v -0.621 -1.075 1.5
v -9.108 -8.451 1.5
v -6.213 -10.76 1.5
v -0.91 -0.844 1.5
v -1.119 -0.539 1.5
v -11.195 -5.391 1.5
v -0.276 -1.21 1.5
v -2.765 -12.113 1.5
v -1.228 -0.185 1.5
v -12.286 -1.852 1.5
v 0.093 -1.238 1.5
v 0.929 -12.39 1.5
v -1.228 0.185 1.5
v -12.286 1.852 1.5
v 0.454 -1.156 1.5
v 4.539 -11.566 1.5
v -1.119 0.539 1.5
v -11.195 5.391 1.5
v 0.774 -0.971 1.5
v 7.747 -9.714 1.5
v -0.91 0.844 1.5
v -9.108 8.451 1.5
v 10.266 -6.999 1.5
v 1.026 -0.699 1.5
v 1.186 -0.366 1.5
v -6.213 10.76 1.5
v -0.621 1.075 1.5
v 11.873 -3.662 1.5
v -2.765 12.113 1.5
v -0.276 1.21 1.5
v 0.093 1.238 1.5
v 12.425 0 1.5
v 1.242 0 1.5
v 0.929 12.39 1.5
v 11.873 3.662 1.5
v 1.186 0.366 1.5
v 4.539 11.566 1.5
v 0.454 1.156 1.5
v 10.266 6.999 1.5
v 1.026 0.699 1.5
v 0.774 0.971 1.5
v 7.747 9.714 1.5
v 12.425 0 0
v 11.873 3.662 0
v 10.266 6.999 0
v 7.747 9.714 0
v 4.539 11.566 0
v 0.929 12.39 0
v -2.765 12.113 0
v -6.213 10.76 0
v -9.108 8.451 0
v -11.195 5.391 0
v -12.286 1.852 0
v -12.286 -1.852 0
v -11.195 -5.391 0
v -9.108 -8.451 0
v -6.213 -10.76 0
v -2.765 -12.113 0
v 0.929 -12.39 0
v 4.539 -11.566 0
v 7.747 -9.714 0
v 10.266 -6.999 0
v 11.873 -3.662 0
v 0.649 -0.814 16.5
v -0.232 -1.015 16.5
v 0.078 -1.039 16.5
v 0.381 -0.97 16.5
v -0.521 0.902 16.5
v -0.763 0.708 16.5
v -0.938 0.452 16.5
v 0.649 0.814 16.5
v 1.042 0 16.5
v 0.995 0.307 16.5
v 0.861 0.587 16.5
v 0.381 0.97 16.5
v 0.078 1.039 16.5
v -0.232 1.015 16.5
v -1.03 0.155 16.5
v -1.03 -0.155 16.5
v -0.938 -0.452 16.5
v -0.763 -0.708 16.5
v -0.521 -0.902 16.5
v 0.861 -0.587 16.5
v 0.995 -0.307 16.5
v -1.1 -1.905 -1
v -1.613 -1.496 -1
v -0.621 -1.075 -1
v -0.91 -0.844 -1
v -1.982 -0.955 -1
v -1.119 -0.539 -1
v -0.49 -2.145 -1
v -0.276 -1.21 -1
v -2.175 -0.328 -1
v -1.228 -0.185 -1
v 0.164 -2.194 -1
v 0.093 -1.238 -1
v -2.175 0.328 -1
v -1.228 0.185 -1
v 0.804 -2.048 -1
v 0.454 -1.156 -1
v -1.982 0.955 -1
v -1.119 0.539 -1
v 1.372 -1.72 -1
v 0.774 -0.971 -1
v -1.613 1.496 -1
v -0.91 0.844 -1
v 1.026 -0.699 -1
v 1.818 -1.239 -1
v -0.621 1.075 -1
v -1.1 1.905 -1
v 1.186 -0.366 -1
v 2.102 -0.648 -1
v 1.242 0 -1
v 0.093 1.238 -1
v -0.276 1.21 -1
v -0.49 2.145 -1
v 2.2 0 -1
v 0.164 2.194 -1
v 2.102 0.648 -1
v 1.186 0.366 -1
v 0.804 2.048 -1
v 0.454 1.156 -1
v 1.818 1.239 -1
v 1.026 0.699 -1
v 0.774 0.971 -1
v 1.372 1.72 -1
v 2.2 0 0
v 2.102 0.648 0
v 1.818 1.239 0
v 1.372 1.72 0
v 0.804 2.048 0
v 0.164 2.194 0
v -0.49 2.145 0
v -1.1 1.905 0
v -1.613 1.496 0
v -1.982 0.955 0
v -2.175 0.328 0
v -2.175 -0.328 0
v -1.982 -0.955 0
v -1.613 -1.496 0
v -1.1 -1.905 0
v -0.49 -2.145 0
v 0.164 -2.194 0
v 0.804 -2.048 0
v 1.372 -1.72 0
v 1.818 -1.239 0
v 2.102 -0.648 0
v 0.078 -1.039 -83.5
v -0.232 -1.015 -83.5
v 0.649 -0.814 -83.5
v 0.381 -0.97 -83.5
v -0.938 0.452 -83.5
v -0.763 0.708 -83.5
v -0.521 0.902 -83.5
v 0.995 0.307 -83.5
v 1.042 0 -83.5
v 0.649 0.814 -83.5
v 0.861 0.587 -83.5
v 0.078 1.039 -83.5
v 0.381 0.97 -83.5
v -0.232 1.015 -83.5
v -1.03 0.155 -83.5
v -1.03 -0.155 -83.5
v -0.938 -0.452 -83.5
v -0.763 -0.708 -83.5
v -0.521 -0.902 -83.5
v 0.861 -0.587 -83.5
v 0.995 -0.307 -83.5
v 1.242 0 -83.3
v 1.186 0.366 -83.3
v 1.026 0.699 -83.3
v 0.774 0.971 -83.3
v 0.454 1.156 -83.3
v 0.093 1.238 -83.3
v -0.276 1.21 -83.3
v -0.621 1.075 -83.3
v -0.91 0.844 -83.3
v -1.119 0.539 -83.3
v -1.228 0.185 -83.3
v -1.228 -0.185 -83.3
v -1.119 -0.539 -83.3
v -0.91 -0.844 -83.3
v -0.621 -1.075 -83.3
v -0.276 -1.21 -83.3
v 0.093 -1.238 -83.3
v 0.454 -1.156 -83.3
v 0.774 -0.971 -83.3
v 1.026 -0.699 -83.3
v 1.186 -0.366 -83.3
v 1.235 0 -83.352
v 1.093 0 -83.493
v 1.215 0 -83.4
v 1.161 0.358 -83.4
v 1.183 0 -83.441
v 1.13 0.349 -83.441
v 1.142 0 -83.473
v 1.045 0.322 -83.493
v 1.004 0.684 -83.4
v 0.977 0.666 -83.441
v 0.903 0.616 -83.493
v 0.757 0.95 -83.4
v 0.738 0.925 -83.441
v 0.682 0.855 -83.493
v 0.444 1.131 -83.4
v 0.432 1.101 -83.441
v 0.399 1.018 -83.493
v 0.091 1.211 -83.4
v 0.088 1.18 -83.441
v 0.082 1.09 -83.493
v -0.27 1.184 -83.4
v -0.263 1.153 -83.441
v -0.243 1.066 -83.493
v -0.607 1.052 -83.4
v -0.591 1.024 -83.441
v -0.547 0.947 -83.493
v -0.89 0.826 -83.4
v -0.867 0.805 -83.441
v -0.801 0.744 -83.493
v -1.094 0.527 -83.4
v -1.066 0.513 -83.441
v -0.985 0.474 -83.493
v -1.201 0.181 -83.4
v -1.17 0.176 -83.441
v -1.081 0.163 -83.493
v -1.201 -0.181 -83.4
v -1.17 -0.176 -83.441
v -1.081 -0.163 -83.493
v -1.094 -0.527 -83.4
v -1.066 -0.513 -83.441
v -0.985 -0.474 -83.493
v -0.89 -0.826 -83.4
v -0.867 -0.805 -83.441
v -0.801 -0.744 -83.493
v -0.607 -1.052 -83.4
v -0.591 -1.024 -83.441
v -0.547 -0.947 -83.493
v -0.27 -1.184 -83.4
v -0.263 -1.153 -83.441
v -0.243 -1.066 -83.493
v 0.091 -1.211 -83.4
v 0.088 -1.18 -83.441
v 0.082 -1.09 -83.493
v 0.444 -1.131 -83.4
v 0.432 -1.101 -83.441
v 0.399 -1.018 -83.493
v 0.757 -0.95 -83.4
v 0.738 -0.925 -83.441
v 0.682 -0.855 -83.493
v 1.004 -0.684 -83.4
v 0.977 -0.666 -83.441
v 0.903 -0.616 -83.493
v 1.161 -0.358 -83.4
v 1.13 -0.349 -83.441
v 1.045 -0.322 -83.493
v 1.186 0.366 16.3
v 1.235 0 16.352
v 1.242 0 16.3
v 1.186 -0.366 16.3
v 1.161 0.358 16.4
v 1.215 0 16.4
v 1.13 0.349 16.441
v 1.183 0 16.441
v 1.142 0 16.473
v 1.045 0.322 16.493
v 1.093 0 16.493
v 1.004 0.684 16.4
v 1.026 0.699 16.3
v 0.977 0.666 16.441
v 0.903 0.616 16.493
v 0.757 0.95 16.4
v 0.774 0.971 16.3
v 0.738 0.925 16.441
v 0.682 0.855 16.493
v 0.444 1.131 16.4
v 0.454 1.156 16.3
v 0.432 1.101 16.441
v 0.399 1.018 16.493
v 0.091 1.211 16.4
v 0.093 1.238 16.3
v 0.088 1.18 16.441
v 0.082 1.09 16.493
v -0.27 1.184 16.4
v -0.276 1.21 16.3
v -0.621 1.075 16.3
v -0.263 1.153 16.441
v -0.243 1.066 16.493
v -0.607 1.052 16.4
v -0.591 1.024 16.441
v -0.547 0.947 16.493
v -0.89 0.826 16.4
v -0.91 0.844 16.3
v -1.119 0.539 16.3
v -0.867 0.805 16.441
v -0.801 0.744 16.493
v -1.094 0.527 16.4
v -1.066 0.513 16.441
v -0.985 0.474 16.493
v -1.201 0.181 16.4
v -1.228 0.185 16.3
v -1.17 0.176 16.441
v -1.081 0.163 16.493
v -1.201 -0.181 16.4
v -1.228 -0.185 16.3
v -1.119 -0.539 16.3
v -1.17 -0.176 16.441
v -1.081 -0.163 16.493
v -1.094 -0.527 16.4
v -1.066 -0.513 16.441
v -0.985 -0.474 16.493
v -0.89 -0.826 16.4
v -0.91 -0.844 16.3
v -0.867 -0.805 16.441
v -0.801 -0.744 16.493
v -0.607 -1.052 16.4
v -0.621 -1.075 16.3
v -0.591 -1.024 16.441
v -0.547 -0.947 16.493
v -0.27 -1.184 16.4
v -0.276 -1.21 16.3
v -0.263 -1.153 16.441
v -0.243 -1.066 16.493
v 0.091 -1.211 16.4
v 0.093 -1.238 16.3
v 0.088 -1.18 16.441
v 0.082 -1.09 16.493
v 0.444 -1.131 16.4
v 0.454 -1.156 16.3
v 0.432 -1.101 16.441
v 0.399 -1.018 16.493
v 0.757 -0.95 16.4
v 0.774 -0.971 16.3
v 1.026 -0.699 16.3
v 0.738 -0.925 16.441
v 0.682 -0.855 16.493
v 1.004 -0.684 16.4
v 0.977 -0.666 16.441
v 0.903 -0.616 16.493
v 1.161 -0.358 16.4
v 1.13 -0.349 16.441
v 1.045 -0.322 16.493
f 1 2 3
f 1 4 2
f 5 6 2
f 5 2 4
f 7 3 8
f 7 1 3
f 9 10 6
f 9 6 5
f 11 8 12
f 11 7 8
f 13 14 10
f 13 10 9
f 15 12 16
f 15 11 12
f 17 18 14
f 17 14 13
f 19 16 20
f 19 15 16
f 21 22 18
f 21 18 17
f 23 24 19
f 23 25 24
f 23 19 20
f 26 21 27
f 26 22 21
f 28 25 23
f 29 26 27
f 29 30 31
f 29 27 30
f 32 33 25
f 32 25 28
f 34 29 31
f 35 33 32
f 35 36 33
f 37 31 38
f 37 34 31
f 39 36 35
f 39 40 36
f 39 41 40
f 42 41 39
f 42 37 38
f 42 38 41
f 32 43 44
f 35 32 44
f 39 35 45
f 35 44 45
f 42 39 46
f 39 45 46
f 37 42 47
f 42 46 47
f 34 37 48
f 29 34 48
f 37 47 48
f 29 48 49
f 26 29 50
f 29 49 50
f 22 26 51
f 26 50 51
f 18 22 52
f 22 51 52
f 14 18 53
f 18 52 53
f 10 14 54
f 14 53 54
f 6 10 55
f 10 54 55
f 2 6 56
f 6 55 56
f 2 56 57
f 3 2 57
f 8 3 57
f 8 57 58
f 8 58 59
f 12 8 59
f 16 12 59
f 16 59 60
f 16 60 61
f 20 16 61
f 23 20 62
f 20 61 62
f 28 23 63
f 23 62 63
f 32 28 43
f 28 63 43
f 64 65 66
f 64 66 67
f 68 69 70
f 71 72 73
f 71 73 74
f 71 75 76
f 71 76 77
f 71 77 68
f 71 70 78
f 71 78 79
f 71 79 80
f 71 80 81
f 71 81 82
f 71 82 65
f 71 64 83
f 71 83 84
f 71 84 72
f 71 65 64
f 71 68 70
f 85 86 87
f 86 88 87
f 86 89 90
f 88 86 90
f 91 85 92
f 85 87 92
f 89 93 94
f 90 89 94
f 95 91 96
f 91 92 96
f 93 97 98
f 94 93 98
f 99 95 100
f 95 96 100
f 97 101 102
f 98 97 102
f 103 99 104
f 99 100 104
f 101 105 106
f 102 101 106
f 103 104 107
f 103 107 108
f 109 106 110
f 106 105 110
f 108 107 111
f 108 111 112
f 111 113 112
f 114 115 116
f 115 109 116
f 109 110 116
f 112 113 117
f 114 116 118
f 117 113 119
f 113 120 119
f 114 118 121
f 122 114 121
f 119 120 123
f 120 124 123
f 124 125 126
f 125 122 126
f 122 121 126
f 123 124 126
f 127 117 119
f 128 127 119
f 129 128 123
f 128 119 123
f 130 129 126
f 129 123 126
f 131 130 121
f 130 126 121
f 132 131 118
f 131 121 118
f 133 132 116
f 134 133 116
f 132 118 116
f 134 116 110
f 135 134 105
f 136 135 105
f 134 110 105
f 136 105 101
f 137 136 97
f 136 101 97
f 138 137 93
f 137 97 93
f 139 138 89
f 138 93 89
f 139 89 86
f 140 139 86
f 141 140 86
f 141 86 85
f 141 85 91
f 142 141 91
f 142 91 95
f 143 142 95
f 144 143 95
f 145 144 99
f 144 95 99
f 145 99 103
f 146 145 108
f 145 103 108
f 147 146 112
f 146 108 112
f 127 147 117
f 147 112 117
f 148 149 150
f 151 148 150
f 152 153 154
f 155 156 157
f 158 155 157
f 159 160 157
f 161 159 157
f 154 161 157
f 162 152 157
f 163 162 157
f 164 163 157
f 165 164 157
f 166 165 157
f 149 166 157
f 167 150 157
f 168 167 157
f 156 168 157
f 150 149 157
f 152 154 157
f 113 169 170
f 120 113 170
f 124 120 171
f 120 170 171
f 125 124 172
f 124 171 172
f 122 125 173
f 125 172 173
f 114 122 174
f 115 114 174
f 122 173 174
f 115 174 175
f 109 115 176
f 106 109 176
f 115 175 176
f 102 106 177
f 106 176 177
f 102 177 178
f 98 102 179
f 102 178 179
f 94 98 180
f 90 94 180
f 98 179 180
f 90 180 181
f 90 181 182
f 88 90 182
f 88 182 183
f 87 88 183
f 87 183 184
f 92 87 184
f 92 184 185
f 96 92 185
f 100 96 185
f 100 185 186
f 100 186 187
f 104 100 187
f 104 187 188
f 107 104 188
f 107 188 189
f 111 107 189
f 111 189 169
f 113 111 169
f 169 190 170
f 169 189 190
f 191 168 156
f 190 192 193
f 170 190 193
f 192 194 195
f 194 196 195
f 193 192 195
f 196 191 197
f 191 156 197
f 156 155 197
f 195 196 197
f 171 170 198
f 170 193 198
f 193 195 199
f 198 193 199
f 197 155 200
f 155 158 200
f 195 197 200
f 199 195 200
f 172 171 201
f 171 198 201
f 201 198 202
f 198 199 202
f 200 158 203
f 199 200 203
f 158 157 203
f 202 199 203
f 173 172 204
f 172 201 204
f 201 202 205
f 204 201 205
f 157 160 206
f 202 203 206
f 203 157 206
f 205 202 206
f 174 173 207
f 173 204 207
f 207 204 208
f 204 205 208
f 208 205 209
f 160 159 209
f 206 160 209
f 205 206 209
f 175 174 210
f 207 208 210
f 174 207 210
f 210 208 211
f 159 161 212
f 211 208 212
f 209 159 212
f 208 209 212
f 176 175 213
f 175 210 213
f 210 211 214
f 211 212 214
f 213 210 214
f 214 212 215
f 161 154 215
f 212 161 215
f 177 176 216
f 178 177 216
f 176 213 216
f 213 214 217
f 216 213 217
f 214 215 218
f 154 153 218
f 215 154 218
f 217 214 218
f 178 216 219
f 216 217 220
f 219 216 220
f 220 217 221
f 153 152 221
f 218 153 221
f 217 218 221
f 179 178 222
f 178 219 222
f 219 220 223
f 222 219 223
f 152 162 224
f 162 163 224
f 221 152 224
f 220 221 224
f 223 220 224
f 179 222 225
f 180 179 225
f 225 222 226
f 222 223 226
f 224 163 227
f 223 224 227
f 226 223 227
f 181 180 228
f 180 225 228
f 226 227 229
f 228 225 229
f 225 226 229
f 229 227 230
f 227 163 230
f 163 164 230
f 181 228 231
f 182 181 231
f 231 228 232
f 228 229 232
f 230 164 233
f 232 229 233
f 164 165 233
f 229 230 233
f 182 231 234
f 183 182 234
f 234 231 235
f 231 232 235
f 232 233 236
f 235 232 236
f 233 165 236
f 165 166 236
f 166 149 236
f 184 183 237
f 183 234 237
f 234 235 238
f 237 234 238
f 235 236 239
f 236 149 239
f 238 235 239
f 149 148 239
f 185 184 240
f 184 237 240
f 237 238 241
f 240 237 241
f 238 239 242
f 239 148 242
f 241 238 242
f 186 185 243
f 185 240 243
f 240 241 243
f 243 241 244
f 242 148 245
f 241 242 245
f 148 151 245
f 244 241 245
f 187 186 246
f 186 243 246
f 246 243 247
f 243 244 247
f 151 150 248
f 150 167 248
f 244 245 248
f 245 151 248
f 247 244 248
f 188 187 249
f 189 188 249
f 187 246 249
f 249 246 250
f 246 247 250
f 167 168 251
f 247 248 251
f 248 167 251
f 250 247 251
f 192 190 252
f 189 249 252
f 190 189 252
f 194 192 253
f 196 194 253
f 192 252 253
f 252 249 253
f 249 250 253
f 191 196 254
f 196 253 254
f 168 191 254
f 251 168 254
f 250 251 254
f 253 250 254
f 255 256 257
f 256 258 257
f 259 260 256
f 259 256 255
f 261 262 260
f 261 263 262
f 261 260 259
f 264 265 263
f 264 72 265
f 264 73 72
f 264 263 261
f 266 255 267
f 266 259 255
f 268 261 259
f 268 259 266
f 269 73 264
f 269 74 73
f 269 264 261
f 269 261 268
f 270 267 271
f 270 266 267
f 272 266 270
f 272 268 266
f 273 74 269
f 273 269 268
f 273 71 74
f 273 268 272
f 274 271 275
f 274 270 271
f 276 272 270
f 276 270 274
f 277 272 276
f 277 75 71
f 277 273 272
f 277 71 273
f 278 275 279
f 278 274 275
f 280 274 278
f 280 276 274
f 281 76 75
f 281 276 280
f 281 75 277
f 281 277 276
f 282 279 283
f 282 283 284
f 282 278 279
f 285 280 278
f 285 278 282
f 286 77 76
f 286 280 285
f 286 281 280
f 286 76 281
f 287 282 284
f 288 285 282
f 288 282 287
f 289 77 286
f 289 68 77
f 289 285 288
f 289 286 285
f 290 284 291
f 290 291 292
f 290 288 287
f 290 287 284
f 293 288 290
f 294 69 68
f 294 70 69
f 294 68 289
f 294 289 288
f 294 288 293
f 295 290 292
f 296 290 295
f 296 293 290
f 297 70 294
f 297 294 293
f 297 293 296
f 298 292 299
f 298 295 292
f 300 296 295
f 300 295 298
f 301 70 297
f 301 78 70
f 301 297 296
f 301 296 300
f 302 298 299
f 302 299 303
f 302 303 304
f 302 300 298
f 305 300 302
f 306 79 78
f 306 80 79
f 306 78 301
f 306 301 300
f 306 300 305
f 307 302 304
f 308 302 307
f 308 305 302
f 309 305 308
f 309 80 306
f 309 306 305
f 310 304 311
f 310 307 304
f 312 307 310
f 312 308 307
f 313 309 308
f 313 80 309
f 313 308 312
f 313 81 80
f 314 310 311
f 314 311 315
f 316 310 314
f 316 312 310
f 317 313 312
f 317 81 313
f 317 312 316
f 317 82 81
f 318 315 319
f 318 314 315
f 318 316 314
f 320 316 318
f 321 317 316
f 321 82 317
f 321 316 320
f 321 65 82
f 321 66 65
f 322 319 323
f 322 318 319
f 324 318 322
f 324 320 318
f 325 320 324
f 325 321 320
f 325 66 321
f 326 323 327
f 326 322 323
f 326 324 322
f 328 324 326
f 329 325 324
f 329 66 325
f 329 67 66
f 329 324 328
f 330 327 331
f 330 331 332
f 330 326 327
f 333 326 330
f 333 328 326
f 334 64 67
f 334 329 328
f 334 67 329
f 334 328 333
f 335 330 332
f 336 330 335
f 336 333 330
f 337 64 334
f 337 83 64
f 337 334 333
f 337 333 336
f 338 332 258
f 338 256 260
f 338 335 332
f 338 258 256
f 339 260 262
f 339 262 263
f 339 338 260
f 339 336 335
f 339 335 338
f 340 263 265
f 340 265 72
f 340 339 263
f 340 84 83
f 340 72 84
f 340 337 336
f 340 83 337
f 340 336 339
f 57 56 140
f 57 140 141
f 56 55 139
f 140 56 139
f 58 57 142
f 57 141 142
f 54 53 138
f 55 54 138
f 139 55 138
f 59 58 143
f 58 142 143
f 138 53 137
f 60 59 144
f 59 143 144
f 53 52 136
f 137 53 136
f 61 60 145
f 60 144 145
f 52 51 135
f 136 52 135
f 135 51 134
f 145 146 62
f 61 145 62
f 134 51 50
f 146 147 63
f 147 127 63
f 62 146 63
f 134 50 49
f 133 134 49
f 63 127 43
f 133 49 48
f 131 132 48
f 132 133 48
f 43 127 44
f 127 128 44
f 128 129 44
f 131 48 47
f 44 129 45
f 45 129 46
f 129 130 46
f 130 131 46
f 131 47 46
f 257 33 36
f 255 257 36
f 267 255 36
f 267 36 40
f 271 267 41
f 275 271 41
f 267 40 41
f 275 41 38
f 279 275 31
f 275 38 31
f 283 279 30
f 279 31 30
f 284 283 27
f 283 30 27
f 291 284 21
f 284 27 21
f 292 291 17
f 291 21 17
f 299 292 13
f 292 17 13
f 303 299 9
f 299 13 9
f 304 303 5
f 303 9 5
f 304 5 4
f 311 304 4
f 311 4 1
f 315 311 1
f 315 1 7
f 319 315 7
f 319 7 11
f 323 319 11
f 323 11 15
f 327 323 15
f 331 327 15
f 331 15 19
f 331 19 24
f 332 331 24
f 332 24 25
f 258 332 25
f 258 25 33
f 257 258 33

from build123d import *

# Parameters (mm, degrees)
ESBO_O1_R                = 12.425
ESBO_O1_R_2              = 1.2415
RESSALTO_EXTRUS_O1_DEPTH = 1.5
RESSALTO_EXTRUS_O2_START = -1
ESBO_O2_R                = 2.2
ESBO_O2_R_2              = 1.2415
RESSALTO_EXTRUS_O2_DEPTH = 1
RESSALTO_EXTRUS_O3_START = -100
ESBO_O3_R                = 1.2415
RESSALTO_EXTRUS_O3_DEPTH = 100
FILETE1_R                = 0.2


with BuildPart() as part:
    # Esboço1 → Ressalto-extrusão1 (new body)
    with BuildSketch(Plane.XY):
        Circle(ESBO_O1_R)
        Circle(ESBO_O1_R_2, mode=Mode.SUBTRACT)
    extrude(amount=RESSALTO_EXTRUS_O1_DEPTH)

    # Esboço2 → Ressalto-extrusão2 (add)
    with BuildSketch(Plane.XY.offset(RESSALTO_EXTRUS_O2_START)):
        Circle(ESBO_O2_R)
        Circle(ESBO_O2_R_2, mode=Mode.SUBTRACT)
    extrude(amount=RESSALTO_EXTRUS_O2_DEPTH)

    # Esboço3 → Ressalto-extrusão3 (add)
    with BuildSketch(Plane.XY.offset(16.5).offset(RESSALTO_EXTRUS_O3_START)):
        Circle(ESBO_O3_R)
    extrude(amount=RESSALTO_EXTRUS_O3_DEPTH)

    # Filete1
    filete1_edges = [part.edges().sort_by_distance(p)[0] for p in [
        (-1.2415, 0, -83.5),
        (-1.2415, 0, 16.5),
    ]]
    fillet(filete1_edges, radius=FILETE1_R)


solid = part.part
